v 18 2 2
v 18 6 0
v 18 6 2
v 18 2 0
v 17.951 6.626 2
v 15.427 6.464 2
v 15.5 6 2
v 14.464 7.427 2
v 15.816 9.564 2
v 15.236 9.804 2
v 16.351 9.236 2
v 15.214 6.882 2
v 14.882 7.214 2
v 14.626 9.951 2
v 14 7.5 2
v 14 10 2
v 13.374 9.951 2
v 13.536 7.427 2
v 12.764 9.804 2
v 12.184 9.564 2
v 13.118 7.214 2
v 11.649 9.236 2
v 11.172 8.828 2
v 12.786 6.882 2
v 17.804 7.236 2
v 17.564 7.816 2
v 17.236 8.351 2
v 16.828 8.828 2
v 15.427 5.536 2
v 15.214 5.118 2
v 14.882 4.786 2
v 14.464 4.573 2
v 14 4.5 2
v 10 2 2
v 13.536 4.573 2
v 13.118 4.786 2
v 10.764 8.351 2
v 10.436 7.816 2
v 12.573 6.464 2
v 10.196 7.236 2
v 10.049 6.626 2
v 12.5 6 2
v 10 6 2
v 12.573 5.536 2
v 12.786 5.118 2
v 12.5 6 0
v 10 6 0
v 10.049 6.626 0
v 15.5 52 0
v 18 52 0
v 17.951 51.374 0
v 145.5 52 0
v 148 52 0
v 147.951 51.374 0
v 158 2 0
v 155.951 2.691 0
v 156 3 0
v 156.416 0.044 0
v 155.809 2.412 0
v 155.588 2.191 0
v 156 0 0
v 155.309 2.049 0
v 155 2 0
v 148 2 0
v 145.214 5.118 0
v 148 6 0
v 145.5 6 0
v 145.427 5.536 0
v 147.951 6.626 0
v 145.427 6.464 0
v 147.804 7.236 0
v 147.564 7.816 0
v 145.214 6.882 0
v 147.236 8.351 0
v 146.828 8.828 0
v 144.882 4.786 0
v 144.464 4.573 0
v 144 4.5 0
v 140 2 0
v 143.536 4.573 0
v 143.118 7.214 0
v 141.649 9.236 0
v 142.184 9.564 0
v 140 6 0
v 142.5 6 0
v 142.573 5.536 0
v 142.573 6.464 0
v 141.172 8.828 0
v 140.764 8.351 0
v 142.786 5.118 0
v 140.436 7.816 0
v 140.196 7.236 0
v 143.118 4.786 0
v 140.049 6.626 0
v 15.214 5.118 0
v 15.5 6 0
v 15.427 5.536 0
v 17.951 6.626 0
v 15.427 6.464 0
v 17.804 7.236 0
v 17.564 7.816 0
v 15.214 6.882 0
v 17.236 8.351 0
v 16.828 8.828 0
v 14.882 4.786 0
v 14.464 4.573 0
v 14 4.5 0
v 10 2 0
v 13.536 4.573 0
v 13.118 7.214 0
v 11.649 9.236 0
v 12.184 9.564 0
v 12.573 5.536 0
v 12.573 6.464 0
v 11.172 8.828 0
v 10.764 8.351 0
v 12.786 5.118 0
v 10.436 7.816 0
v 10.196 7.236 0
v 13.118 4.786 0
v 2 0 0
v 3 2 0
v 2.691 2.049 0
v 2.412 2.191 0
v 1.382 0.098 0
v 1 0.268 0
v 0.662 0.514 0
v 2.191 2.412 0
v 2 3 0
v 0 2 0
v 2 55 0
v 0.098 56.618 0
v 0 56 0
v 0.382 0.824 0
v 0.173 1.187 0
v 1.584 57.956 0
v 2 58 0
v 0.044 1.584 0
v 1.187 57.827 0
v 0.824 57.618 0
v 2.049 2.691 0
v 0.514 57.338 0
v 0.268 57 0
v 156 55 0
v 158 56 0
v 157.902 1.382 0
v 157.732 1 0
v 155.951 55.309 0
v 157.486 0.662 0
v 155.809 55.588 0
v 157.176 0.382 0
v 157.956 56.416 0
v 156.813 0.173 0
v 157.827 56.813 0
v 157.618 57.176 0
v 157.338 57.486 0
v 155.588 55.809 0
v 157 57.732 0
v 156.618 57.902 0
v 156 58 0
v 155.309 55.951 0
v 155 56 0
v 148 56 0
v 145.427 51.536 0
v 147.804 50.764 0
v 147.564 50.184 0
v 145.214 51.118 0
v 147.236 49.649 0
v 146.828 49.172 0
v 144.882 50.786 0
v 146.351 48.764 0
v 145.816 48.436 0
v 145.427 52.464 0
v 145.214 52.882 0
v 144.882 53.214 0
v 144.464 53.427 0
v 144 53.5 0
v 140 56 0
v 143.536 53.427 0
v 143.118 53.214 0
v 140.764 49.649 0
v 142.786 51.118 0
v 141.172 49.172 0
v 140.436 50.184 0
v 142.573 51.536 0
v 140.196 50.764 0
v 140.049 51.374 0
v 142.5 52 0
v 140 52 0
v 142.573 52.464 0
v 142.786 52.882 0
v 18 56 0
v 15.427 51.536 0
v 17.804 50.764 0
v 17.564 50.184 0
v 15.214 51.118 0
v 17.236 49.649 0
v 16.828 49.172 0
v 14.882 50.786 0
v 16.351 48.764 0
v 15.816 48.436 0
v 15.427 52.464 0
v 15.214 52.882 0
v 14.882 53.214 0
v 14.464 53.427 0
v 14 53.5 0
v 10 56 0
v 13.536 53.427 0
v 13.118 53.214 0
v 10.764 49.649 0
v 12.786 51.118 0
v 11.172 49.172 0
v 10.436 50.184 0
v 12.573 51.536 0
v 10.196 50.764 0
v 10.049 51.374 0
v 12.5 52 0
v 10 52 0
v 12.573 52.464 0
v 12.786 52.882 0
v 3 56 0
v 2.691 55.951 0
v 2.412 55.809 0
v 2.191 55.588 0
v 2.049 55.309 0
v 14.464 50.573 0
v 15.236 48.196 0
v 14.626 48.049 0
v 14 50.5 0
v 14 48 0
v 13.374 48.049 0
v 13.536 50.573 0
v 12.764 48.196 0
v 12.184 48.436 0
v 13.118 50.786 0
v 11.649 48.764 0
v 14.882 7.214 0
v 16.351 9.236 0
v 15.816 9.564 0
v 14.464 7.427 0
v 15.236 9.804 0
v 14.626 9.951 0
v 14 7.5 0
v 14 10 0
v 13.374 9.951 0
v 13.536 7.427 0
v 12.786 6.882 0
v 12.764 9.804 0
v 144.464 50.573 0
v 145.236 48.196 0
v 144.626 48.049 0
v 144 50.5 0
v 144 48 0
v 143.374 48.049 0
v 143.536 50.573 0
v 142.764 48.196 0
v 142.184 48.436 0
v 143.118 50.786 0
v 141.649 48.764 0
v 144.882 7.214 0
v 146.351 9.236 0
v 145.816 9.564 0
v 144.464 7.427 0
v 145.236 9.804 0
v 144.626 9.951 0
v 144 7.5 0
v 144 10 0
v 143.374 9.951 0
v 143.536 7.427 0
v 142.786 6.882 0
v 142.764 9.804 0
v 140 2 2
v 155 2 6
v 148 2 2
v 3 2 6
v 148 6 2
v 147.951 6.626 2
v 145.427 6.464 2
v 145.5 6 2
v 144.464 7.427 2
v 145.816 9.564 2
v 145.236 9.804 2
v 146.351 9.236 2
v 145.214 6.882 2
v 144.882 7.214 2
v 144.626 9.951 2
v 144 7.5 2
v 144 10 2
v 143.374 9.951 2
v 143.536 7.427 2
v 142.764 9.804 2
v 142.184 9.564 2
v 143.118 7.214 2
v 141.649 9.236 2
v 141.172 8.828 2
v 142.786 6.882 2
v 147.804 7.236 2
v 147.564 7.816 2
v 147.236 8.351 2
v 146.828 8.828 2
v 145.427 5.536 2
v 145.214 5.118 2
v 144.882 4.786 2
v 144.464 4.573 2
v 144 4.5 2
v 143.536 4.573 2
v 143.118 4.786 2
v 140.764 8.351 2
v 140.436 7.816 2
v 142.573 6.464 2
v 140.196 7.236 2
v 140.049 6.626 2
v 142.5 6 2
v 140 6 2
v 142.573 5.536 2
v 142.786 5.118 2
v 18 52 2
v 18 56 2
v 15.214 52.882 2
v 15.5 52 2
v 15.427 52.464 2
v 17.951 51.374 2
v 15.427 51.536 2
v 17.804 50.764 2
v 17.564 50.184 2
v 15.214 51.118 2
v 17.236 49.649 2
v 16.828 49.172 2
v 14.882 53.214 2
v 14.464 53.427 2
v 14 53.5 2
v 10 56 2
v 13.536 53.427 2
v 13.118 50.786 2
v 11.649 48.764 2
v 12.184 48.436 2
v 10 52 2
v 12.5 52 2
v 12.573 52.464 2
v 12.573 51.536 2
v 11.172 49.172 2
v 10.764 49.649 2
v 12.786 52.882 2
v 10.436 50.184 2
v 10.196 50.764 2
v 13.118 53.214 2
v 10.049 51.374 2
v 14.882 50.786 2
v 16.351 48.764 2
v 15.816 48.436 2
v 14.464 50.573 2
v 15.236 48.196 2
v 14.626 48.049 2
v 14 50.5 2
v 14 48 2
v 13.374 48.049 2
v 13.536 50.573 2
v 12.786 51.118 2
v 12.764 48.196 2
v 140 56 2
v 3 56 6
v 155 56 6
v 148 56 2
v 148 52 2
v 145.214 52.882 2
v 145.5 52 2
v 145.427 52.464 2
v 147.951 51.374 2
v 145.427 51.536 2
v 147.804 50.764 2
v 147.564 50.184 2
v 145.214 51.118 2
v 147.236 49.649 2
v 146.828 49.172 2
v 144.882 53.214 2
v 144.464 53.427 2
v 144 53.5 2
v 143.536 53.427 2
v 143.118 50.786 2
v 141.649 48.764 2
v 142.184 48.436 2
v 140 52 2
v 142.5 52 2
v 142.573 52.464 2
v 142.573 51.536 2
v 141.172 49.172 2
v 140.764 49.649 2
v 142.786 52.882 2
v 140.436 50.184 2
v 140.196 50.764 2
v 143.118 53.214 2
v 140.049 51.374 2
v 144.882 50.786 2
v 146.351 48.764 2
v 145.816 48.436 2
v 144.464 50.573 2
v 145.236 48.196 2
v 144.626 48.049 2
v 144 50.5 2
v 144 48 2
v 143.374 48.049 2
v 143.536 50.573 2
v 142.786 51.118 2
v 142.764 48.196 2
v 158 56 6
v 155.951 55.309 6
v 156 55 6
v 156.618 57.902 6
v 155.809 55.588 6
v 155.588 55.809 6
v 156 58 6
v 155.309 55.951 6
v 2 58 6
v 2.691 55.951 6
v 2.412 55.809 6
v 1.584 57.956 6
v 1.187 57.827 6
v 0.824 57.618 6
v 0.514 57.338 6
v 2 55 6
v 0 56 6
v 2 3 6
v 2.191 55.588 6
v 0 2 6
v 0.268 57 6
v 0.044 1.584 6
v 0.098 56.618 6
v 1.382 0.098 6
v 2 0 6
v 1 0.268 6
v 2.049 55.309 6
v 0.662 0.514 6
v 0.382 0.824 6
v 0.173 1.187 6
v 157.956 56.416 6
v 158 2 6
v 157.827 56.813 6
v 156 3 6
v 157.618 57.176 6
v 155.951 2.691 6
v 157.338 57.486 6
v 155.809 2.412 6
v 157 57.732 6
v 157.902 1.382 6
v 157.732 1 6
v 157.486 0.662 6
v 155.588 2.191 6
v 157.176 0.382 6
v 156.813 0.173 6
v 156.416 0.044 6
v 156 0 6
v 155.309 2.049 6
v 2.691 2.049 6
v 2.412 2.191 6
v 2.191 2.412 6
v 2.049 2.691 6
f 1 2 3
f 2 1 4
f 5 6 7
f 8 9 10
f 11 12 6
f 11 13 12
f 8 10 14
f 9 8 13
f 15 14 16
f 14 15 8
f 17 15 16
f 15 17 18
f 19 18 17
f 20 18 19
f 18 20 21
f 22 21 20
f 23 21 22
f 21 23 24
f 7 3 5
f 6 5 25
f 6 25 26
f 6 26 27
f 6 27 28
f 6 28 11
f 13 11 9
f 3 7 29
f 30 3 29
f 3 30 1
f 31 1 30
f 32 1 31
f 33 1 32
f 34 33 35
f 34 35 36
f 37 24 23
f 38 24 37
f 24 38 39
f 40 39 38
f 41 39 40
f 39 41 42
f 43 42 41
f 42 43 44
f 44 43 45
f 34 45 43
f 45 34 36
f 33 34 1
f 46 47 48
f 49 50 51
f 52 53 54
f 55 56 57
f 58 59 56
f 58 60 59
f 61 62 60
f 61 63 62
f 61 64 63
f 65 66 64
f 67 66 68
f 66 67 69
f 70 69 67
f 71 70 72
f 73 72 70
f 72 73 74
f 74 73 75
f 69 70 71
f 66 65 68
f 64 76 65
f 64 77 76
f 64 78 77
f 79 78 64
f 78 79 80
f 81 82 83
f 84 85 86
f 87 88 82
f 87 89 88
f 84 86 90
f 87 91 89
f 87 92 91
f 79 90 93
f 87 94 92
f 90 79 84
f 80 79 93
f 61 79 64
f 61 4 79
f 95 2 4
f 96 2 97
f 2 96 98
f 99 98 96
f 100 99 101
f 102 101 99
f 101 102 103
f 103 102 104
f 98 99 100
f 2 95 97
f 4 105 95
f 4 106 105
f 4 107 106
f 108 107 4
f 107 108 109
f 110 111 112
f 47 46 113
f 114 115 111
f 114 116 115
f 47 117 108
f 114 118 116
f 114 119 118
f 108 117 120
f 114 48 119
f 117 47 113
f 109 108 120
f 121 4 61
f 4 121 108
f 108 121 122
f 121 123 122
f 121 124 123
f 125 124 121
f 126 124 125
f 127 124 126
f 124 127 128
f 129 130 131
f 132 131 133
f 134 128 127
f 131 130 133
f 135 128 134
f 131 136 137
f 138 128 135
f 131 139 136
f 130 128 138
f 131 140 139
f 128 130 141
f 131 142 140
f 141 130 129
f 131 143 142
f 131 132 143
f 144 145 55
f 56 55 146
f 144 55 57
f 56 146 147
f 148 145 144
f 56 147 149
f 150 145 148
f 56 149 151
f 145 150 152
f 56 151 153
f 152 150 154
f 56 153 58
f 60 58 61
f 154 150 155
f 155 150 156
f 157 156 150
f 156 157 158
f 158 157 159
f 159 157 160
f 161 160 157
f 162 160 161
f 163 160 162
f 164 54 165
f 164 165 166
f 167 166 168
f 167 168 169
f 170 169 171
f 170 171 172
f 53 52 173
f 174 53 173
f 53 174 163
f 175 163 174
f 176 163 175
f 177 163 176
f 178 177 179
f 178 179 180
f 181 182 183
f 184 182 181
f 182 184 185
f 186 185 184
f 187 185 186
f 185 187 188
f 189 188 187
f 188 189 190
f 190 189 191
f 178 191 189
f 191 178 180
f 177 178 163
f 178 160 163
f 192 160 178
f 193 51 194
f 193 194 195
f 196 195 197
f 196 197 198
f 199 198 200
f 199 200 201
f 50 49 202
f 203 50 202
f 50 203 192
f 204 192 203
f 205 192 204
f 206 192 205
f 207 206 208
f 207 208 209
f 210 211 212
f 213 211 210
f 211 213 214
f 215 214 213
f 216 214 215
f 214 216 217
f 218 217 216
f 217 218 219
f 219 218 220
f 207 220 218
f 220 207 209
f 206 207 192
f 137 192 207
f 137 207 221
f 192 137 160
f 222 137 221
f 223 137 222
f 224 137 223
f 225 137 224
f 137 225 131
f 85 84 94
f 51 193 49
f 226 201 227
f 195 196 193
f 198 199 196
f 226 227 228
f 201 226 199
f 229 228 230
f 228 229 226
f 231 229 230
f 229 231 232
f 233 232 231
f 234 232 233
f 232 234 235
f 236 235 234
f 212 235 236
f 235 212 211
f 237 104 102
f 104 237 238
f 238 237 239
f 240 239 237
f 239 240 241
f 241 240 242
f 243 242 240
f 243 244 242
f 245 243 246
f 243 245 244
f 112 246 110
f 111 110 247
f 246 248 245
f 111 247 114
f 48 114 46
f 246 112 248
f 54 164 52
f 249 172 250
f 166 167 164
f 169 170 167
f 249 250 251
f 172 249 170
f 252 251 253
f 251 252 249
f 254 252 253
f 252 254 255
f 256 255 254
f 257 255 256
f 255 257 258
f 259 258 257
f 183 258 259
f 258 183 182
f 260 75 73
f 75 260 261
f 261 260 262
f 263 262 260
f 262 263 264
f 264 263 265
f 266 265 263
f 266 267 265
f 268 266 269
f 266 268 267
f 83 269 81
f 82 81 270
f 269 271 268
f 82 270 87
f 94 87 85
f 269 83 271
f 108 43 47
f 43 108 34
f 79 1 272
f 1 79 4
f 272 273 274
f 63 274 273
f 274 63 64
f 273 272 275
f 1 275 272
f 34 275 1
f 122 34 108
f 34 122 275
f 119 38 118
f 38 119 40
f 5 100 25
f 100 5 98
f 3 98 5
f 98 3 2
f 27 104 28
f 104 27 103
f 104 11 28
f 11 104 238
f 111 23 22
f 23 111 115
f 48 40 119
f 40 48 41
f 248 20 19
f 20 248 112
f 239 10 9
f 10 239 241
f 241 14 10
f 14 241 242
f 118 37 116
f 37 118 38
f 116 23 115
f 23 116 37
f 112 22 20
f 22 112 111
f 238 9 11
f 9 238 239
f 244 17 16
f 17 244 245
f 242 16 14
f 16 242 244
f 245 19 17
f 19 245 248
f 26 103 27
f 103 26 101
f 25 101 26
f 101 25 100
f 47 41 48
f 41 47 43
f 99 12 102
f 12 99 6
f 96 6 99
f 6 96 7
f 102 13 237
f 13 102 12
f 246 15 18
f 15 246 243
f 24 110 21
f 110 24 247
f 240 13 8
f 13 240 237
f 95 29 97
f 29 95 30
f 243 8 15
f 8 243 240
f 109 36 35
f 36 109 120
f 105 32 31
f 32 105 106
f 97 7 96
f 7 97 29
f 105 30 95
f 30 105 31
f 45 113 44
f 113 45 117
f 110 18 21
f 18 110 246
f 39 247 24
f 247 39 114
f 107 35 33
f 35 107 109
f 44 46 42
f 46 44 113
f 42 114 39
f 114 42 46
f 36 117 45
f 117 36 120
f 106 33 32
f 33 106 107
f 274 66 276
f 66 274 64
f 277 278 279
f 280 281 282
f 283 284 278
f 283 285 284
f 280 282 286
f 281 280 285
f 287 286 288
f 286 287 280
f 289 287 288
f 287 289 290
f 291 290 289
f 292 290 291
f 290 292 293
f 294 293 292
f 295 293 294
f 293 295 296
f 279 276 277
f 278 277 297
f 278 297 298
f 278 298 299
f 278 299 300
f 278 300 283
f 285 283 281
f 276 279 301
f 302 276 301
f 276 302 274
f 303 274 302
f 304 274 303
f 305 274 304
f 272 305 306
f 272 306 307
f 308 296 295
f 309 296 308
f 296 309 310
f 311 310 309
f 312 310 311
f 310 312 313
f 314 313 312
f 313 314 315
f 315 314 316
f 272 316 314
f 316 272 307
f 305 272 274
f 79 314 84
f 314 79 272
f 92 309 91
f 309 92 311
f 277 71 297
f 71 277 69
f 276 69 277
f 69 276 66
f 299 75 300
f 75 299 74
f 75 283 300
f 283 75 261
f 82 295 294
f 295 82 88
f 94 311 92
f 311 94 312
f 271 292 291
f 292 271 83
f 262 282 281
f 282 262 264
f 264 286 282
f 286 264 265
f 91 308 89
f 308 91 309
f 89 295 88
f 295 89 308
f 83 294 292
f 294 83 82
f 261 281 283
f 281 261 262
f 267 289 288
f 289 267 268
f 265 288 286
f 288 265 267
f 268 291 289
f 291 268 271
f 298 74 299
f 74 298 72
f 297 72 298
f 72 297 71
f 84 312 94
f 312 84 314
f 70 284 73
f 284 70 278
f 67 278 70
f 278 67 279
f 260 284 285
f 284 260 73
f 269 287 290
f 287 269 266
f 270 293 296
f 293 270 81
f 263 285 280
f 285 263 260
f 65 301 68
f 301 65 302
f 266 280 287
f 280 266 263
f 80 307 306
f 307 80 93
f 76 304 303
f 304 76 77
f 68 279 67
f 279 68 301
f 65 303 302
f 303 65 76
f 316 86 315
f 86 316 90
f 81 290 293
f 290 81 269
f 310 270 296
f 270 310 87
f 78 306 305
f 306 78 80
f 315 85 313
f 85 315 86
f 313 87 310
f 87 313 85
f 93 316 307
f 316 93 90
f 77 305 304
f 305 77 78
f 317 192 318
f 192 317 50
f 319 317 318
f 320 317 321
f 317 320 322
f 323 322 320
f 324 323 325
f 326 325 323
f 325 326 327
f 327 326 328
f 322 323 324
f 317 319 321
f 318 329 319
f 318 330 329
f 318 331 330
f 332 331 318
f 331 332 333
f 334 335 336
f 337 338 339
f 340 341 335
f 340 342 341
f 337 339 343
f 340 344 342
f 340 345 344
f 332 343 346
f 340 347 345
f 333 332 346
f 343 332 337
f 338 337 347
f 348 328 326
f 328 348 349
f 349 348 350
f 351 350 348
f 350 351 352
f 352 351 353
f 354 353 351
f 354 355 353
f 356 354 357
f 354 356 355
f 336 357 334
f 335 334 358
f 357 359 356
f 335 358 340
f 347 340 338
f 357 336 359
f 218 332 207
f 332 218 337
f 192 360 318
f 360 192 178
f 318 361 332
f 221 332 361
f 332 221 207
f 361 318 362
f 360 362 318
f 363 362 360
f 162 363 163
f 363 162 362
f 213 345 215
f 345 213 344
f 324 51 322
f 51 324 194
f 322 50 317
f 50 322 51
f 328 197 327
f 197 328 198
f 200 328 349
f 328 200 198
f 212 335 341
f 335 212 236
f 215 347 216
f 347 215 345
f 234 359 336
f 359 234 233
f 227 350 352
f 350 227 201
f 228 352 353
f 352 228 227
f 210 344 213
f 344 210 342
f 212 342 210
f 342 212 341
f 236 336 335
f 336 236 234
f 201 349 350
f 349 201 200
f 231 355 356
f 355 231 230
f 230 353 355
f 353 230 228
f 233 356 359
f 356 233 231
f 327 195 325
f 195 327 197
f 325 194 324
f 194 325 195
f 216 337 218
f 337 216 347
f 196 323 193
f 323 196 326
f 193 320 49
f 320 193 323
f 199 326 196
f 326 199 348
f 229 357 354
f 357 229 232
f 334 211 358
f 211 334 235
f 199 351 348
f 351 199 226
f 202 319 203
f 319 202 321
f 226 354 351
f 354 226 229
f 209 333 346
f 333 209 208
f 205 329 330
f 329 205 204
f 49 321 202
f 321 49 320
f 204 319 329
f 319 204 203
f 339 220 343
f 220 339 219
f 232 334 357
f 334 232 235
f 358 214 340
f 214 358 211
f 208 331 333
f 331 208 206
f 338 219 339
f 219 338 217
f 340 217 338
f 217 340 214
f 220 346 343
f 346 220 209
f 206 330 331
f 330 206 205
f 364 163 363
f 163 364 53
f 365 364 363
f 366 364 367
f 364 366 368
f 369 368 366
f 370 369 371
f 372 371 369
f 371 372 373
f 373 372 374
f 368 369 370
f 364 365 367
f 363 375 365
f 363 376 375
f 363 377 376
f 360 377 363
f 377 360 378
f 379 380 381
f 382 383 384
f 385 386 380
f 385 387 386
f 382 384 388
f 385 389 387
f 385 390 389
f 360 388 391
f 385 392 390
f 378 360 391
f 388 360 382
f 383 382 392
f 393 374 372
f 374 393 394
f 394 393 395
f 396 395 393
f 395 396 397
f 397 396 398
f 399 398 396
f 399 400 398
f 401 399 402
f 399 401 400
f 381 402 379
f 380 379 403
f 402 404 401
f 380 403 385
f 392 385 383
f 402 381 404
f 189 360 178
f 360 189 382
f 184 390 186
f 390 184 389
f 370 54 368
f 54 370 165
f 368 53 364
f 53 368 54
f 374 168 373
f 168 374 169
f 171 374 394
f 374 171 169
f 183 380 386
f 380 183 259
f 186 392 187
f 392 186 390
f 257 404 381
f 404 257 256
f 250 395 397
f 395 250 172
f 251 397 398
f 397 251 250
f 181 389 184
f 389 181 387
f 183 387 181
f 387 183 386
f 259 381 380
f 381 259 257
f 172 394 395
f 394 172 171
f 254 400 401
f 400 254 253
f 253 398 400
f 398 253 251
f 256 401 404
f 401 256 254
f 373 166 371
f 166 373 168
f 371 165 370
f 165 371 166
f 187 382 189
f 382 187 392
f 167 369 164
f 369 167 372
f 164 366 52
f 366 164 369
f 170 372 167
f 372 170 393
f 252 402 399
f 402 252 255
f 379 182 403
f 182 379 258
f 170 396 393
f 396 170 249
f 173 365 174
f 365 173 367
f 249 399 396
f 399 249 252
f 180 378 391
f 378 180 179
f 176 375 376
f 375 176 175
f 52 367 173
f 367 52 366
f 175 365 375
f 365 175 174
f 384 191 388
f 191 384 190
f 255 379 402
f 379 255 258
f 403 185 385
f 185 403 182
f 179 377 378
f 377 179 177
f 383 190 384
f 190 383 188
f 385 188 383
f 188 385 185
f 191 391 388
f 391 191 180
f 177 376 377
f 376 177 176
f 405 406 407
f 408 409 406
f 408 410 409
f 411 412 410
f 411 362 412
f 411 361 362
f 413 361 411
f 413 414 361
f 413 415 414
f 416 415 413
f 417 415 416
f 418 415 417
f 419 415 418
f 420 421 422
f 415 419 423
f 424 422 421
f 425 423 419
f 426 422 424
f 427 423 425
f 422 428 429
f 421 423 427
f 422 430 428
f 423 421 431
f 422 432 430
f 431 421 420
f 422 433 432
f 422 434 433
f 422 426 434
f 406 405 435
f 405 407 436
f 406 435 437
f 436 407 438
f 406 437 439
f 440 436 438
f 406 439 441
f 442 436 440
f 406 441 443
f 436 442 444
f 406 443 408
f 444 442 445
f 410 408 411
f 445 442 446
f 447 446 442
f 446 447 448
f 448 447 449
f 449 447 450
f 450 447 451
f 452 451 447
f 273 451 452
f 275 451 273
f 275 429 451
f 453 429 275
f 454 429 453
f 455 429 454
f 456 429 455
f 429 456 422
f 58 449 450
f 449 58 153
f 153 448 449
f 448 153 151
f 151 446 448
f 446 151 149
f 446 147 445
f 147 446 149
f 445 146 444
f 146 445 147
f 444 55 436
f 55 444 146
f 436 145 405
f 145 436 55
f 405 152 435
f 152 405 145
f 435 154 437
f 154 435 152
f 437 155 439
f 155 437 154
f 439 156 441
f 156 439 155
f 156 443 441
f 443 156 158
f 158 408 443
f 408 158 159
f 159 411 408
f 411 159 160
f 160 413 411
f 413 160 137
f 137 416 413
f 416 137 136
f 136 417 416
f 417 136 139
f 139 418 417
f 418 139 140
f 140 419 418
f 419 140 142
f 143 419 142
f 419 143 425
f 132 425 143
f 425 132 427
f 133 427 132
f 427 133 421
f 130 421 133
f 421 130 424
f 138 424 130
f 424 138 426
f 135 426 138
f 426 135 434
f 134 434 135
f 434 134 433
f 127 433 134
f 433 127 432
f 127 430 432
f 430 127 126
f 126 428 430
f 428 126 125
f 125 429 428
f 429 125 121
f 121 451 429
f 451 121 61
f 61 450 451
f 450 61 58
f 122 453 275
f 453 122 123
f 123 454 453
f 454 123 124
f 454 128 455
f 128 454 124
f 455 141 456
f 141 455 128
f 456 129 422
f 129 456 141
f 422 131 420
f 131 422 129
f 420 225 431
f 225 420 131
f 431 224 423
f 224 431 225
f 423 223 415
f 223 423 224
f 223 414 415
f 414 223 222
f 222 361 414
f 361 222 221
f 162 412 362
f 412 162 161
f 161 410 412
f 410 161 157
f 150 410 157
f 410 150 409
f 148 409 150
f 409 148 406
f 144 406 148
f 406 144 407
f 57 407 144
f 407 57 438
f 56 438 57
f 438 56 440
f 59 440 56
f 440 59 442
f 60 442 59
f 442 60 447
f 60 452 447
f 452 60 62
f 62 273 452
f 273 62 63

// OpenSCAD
difference() {
  linear_extrude(6,convexity=3) shell();
  *cube([2,58,19.99]);
  *for(y=[5,23,41]) translate([-0.01,y,4.01]) cube([3.02,12,16]);
}
mirrory(58) for(x=[10,140]) translate([x,2]) difference() {
  union() {
    cube([8,4,2]);
    translate([4,4]) cylinder(d=8,h=2,$fn=40);
  }
  translate([4,4,-.01]) cylinder(d=3,h=2.02,$fn=20);
}
*for(y=[0,56]) translate([0,y]) cube([160,2,20]);
*cube([160,58,2]);
*translate([158,0]) cube([2,58,20]);

module lid() {
  difference() {
    translate([2,2]) offset(2,$fn=30) square([154,54]);
    mirrory(58) for(x=[10,140]) translate([x,2]) translate([4,4]) circle(d=3,$fn=20);
  }
}
module shell() {
  difference() {
    translate([2,2]) offset(2,$fn=30) square([154,54]);
    translate([3,3]) offset(1,$fn=20) square([152,52]);
  }
}
module mirrory(off=0)
{
  translate([0,off/2]) for(m=[0,1]) mirror([0,m]) translate([0,off/-2]) children();
}
